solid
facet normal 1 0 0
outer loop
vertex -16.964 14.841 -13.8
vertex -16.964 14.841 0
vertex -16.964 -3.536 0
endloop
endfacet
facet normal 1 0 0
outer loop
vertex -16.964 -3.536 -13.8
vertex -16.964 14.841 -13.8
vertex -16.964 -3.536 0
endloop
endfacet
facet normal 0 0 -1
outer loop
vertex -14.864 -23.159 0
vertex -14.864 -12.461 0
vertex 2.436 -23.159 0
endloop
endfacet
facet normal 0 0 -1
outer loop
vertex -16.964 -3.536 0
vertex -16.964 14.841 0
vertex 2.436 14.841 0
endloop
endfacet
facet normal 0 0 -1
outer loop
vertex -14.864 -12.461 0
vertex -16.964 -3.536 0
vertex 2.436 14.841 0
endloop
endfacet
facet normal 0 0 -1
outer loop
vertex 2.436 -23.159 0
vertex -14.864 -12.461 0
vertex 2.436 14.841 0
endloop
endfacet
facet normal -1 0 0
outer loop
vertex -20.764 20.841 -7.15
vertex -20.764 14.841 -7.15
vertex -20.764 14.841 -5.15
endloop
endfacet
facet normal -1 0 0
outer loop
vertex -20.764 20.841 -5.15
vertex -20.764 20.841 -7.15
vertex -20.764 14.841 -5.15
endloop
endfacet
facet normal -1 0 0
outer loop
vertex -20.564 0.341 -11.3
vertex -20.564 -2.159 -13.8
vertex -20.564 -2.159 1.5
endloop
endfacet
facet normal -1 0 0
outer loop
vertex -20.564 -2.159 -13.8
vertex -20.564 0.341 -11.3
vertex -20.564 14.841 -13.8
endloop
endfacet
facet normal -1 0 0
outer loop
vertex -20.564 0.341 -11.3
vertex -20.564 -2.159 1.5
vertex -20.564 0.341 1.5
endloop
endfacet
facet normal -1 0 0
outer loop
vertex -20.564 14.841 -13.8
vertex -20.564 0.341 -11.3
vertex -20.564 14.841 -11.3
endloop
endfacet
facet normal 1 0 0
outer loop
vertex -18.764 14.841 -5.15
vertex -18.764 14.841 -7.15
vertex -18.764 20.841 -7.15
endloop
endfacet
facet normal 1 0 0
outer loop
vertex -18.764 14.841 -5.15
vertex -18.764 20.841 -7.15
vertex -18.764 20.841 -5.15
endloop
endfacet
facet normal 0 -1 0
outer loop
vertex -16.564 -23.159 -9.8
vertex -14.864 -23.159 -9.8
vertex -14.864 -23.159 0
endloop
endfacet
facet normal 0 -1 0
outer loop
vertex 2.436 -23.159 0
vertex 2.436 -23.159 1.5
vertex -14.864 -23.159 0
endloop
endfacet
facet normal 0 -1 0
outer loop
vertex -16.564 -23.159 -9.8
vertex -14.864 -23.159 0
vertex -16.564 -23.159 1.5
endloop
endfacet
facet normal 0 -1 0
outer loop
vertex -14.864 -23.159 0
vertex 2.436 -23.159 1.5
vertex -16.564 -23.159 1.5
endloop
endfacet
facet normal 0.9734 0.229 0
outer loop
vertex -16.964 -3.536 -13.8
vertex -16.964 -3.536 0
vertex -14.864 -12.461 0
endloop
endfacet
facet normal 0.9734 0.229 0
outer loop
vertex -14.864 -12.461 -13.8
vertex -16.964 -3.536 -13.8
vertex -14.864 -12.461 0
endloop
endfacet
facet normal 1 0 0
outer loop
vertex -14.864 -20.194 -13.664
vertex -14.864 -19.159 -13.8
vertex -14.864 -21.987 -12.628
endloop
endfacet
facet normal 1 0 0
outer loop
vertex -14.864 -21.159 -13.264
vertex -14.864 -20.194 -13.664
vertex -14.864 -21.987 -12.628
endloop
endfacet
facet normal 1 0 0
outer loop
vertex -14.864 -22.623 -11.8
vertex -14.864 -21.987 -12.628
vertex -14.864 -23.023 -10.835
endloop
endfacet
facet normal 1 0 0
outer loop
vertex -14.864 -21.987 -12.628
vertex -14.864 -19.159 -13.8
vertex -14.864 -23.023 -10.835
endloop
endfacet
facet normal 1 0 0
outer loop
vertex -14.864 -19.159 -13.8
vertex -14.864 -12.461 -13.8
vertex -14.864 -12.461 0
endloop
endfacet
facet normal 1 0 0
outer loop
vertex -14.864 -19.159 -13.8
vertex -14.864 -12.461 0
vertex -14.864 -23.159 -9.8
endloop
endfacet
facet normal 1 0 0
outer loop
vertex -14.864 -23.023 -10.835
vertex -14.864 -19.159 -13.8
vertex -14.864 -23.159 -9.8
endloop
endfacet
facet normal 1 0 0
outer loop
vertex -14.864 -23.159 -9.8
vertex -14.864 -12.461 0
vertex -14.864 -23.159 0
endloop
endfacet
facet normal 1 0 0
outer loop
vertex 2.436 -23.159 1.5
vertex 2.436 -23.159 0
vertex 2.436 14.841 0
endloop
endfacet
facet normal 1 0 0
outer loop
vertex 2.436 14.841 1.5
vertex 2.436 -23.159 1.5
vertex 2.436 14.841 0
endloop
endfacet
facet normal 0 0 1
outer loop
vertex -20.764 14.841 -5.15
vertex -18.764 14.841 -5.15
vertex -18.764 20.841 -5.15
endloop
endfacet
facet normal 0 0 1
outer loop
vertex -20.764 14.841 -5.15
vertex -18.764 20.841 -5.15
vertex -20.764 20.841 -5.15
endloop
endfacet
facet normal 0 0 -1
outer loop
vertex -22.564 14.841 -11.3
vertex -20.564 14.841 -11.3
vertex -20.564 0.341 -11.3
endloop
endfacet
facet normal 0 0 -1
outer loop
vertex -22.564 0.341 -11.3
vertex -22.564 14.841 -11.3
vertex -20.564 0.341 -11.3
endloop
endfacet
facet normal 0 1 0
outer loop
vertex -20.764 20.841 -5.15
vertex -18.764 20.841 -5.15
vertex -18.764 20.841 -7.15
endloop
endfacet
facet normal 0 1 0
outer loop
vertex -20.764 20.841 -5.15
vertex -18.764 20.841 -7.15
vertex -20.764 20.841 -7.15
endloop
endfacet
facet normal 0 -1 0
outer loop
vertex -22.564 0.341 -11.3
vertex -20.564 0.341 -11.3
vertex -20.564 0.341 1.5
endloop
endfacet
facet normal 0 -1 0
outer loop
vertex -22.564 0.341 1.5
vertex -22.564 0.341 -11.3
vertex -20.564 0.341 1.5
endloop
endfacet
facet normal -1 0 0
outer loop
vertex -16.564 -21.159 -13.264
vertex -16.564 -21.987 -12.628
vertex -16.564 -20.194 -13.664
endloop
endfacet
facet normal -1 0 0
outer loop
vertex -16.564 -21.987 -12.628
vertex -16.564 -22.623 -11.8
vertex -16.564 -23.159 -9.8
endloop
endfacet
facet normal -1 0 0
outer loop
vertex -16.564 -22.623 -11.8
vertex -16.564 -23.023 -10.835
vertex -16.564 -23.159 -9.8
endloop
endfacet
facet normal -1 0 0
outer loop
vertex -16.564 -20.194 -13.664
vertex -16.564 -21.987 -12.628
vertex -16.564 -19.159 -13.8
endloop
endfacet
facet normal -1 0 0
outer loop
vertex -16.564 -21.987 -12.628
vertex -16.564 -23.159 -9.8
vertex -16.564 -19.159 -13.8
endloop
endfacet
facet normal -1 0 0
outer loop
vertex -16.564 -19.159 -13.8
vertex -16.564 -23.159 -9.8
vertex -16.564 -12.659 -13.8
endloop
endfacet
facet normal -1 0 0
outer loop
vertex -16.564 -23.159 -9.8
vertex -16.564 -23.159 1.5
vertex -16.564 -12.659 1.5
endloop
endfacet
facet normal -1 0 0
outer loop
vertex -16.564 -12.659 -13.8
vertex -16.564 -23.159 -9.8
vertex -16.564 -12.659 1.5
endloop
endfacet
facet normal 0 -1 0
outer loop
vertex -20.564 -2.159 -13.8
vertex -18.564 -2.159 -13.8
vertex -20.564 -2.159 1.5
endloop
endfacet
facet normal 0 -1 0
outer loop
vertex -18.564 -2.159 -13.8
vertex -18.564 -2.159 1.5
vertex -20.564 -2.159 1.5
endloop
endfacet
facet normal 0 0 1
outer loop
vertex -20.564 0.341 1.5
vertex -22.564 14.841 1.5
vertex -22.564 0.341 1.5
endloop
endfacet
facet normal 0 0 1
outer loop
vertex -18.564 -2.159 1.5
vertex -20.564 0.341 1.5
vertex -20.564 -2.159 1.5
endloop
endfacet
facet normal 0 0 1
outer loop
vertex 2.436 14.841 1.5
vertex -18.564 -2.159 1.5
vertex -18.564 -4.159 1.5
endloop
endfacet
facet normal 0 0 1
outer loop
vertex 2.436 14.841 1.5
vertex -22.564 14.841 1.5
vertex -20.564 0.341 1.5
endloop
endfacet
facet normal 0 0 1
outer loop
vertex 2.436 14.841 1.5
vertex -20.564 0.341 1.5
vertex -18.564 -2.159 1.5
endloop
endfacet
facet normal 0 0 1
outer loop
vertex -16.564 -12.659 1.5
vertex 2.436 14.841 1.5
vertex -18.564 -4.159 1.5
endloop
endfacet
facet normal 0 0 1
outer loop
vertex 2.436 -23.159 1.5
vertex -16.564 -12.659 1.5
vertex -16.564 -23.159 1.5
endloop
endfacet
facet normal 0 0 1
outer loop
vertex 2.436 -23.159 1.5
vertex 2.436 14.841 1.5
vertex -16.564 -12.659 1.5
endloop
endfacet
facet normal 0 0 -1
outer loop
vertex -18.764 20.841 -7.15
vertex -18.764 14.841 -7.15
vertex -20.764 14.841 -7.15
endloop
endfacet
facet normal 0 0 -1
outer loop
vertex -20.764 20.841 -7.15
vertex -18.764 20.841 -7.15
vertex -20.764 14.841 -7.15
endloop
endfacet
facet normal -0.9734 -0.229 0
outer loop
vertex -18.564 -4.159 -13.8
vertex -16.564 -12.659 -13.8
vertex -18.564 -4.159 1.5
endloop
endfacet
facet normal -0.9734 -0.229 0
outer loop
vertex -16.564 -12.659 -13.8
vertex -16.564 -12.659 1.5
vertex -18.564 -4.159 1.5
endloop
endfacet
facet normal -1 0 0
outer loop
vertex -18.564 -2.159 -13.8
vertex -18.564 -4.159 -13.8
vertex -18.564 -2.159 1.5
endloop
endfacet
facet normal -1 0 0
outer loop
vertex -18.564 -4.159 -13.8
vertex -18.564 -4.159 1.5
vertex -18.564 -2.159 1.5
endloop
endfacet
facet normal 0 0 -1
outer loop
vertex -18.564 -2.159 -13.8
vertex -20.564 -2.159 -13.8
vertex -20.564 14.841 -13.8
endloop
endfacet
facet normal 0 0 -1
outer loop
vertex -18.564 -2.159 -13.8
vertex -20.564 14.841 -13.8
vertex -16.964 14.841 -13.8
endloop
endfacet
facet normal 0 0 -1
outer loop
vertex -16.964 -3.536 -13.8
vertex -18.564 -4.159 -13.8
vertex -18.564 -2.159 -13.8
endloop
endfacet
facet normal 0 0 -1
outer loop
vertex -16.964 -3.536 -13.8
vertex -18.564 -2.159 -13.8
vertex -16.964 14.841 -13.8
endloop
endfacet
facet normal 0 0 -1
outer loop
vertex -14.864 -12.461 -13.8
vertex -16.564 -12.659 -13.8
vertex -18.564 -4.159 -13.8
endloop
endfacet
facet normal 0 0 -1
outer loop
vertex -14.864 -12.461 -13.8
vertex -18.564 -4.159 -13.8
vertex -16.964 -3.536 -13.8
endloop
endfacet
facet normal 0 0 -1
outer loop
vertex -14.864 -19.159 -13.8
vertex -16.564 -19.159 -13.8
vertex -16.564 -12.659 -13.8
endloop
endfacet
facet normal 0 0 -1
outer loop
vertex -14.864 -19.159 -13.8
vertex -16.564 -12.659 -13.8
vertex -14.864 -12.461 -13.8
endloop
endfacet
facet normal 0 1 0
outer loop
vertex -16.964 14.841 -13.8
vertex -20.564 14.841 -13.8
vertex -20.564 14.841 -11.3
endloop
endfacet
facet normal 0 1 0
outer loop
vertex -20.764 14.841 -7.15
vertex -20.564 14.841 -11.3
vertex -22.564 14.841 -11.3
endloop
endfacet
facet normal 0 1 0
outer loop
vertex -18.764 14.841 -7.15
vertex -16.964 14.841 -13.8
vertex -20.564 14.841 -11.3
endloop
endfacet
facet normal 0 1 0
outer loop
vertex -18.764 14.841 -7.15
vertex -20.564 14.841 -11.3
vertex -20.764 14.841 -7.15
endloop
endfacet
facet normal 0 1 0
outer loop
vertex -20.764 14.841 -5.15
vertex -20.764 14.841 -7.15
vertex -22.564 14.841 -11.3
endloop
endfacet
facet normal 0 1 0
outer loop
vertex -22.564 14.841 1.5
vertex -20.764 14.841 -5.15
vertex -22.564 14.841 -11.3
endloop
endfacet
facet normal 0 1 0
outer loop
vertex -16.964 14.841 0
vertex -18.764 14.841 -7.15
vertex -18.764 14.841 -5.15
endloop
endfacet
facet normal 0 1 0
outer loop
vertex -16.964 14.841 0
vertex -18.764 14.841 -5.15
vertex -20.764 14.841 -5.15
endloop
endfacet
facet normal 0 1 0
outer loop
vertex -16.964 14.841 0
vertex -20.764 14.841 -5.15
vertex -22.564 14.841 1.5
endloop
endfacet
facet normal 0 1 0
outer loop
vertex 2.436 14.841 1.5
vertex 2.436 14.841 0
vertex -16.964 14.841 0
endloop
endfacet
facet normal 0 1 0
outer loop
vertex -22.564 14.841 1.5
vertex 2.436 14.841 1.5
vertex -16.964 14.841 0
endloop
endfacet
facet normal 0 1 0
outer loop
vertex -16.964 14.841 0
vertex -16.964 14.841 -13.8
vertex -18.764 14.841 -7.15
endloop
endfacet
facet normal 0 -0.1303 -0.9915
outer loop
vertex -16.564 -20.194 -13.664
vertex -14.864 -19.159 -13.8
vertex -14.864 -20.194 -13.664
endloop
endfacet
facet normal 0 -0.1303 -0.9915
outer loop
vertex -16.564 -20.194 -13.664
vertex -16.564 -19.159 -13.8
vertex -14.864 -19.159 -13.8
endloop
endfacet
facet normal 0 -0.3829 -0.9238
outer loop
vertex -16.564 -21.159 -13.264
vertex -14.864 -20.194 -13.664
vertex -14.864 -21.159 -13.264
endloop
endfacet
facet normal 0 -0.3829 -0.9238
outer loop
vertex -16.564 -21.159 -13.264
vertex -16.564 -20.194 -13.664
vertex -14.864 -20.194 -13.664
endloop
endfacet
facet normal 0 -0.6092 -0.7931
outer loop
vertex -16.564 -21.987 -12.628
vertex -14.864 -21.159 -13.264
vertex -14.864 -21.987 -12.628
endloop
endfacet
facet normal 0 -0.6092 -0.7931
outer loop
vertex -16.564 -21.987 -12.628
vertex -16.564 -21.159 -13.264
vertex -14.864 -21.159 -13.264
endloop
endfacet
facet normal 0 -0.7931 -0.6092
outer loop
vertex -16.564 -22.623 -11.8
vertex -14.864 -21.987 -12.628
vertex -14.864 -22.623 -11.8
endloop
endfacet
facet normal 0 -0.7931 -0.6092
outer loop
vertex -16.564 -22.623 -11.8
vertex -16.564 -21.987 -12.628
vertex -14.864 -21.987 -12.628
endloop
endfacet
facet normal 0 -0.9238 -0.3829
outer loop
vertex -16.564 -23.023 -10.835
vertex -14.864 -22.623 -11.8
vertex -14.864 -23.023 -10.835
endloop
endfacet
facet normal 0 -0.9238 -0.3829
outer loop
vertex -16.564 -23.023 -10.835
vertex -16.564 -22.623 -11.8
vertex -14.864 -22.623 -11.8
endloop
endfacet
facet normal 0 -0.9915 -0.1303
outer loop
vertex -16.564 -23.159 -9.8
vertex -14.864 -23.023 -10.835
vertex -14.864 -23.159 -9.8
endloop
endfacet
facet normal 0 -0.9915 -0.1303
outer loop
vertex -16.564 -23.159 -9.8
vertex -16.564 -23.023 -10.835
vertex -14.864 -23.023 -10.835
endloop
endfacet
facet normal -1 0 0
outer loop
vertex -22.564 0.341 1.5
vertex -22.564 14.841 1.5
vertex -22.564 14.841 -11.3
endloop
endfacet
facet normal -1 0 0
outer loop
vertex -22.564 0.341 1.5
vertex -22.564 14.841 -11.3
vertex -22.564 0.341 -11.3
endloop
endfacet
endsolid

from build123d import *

# Parameters (mm, degrees)
F1_DEPTH = 1.5
F3_DEPTH = 13.8
F4_W     = 14.5
F4_H     = 12.8
F5_DEPTH = 2
F6_W     = 2
F6_H     = 2
F7_DEPTH = 6
F8_R     = 4


with BuildPart() as f1:
    # F0 (on Top) → F1 (new body)
    with BuildSketch(Plane.XY):
        Polygon((2.435753, 14.841201), (-20.564247, 14.841201), (-20.564247, -2.158799), (-18.564247, -2.158799), (-18.564247, -4.158799), (-16.564247, -12.658799), (-16.564247, -23.158799), (2.435753, -23.158799), align=None)
    extrude(amount=F1_DEPTH)

    # F2 (on face) → F3 (join)
    with BuildSketch(Plane(origin=(0, 0, 0), x_dir=(1, 0, 0), z_dir=(0, 0, -1))):
        Polygon((-14.864247, 23.158799), (-16.564247, 23.158799), (-16.564247, 12.658799), (-18.564247, 4.158799), (-18.564247, 2.158799), (-20.564247, 2.158799), (-20.564247, -14.841201), (-16.964247, -14.841201), (-16.964247, 3.536493), (-14.864247, 12.461493), align=None)
    extrude(amount=F3_DEPTH)

    # F4 (on face) → F5 (join)
    with BuildSketch(Plane(origin=(-20.564247, 0, 0), x_dir=(0, -1, 0), z_dir=(-1, 0, 0))):
        with Locations((-7.591201, -4.9)):
            Rectangle(F4_W, F4_H)
    extrude(amount=F5_DEPTH)

    # F6 (on face) → F7 (join)
    with BuildSketch(Plane(origin=(0, 14.841201, 0), x_dir=(-1, 0, 0), z_dir=(0, 1, 0))):
        with Locations((19.764247, -6.15)):
            Rectangle(F6_W, F6_H)
    extrude(amount=F7_DEPTH)

    # F8
    f8_edges = [f1.edges().sort_by_distance(p)[0] for p in [
        (-15.714247, -23.158799, -13.8),
    ]]
    fillet(f8_edges, radius=F8_R)


solid = f1.part
